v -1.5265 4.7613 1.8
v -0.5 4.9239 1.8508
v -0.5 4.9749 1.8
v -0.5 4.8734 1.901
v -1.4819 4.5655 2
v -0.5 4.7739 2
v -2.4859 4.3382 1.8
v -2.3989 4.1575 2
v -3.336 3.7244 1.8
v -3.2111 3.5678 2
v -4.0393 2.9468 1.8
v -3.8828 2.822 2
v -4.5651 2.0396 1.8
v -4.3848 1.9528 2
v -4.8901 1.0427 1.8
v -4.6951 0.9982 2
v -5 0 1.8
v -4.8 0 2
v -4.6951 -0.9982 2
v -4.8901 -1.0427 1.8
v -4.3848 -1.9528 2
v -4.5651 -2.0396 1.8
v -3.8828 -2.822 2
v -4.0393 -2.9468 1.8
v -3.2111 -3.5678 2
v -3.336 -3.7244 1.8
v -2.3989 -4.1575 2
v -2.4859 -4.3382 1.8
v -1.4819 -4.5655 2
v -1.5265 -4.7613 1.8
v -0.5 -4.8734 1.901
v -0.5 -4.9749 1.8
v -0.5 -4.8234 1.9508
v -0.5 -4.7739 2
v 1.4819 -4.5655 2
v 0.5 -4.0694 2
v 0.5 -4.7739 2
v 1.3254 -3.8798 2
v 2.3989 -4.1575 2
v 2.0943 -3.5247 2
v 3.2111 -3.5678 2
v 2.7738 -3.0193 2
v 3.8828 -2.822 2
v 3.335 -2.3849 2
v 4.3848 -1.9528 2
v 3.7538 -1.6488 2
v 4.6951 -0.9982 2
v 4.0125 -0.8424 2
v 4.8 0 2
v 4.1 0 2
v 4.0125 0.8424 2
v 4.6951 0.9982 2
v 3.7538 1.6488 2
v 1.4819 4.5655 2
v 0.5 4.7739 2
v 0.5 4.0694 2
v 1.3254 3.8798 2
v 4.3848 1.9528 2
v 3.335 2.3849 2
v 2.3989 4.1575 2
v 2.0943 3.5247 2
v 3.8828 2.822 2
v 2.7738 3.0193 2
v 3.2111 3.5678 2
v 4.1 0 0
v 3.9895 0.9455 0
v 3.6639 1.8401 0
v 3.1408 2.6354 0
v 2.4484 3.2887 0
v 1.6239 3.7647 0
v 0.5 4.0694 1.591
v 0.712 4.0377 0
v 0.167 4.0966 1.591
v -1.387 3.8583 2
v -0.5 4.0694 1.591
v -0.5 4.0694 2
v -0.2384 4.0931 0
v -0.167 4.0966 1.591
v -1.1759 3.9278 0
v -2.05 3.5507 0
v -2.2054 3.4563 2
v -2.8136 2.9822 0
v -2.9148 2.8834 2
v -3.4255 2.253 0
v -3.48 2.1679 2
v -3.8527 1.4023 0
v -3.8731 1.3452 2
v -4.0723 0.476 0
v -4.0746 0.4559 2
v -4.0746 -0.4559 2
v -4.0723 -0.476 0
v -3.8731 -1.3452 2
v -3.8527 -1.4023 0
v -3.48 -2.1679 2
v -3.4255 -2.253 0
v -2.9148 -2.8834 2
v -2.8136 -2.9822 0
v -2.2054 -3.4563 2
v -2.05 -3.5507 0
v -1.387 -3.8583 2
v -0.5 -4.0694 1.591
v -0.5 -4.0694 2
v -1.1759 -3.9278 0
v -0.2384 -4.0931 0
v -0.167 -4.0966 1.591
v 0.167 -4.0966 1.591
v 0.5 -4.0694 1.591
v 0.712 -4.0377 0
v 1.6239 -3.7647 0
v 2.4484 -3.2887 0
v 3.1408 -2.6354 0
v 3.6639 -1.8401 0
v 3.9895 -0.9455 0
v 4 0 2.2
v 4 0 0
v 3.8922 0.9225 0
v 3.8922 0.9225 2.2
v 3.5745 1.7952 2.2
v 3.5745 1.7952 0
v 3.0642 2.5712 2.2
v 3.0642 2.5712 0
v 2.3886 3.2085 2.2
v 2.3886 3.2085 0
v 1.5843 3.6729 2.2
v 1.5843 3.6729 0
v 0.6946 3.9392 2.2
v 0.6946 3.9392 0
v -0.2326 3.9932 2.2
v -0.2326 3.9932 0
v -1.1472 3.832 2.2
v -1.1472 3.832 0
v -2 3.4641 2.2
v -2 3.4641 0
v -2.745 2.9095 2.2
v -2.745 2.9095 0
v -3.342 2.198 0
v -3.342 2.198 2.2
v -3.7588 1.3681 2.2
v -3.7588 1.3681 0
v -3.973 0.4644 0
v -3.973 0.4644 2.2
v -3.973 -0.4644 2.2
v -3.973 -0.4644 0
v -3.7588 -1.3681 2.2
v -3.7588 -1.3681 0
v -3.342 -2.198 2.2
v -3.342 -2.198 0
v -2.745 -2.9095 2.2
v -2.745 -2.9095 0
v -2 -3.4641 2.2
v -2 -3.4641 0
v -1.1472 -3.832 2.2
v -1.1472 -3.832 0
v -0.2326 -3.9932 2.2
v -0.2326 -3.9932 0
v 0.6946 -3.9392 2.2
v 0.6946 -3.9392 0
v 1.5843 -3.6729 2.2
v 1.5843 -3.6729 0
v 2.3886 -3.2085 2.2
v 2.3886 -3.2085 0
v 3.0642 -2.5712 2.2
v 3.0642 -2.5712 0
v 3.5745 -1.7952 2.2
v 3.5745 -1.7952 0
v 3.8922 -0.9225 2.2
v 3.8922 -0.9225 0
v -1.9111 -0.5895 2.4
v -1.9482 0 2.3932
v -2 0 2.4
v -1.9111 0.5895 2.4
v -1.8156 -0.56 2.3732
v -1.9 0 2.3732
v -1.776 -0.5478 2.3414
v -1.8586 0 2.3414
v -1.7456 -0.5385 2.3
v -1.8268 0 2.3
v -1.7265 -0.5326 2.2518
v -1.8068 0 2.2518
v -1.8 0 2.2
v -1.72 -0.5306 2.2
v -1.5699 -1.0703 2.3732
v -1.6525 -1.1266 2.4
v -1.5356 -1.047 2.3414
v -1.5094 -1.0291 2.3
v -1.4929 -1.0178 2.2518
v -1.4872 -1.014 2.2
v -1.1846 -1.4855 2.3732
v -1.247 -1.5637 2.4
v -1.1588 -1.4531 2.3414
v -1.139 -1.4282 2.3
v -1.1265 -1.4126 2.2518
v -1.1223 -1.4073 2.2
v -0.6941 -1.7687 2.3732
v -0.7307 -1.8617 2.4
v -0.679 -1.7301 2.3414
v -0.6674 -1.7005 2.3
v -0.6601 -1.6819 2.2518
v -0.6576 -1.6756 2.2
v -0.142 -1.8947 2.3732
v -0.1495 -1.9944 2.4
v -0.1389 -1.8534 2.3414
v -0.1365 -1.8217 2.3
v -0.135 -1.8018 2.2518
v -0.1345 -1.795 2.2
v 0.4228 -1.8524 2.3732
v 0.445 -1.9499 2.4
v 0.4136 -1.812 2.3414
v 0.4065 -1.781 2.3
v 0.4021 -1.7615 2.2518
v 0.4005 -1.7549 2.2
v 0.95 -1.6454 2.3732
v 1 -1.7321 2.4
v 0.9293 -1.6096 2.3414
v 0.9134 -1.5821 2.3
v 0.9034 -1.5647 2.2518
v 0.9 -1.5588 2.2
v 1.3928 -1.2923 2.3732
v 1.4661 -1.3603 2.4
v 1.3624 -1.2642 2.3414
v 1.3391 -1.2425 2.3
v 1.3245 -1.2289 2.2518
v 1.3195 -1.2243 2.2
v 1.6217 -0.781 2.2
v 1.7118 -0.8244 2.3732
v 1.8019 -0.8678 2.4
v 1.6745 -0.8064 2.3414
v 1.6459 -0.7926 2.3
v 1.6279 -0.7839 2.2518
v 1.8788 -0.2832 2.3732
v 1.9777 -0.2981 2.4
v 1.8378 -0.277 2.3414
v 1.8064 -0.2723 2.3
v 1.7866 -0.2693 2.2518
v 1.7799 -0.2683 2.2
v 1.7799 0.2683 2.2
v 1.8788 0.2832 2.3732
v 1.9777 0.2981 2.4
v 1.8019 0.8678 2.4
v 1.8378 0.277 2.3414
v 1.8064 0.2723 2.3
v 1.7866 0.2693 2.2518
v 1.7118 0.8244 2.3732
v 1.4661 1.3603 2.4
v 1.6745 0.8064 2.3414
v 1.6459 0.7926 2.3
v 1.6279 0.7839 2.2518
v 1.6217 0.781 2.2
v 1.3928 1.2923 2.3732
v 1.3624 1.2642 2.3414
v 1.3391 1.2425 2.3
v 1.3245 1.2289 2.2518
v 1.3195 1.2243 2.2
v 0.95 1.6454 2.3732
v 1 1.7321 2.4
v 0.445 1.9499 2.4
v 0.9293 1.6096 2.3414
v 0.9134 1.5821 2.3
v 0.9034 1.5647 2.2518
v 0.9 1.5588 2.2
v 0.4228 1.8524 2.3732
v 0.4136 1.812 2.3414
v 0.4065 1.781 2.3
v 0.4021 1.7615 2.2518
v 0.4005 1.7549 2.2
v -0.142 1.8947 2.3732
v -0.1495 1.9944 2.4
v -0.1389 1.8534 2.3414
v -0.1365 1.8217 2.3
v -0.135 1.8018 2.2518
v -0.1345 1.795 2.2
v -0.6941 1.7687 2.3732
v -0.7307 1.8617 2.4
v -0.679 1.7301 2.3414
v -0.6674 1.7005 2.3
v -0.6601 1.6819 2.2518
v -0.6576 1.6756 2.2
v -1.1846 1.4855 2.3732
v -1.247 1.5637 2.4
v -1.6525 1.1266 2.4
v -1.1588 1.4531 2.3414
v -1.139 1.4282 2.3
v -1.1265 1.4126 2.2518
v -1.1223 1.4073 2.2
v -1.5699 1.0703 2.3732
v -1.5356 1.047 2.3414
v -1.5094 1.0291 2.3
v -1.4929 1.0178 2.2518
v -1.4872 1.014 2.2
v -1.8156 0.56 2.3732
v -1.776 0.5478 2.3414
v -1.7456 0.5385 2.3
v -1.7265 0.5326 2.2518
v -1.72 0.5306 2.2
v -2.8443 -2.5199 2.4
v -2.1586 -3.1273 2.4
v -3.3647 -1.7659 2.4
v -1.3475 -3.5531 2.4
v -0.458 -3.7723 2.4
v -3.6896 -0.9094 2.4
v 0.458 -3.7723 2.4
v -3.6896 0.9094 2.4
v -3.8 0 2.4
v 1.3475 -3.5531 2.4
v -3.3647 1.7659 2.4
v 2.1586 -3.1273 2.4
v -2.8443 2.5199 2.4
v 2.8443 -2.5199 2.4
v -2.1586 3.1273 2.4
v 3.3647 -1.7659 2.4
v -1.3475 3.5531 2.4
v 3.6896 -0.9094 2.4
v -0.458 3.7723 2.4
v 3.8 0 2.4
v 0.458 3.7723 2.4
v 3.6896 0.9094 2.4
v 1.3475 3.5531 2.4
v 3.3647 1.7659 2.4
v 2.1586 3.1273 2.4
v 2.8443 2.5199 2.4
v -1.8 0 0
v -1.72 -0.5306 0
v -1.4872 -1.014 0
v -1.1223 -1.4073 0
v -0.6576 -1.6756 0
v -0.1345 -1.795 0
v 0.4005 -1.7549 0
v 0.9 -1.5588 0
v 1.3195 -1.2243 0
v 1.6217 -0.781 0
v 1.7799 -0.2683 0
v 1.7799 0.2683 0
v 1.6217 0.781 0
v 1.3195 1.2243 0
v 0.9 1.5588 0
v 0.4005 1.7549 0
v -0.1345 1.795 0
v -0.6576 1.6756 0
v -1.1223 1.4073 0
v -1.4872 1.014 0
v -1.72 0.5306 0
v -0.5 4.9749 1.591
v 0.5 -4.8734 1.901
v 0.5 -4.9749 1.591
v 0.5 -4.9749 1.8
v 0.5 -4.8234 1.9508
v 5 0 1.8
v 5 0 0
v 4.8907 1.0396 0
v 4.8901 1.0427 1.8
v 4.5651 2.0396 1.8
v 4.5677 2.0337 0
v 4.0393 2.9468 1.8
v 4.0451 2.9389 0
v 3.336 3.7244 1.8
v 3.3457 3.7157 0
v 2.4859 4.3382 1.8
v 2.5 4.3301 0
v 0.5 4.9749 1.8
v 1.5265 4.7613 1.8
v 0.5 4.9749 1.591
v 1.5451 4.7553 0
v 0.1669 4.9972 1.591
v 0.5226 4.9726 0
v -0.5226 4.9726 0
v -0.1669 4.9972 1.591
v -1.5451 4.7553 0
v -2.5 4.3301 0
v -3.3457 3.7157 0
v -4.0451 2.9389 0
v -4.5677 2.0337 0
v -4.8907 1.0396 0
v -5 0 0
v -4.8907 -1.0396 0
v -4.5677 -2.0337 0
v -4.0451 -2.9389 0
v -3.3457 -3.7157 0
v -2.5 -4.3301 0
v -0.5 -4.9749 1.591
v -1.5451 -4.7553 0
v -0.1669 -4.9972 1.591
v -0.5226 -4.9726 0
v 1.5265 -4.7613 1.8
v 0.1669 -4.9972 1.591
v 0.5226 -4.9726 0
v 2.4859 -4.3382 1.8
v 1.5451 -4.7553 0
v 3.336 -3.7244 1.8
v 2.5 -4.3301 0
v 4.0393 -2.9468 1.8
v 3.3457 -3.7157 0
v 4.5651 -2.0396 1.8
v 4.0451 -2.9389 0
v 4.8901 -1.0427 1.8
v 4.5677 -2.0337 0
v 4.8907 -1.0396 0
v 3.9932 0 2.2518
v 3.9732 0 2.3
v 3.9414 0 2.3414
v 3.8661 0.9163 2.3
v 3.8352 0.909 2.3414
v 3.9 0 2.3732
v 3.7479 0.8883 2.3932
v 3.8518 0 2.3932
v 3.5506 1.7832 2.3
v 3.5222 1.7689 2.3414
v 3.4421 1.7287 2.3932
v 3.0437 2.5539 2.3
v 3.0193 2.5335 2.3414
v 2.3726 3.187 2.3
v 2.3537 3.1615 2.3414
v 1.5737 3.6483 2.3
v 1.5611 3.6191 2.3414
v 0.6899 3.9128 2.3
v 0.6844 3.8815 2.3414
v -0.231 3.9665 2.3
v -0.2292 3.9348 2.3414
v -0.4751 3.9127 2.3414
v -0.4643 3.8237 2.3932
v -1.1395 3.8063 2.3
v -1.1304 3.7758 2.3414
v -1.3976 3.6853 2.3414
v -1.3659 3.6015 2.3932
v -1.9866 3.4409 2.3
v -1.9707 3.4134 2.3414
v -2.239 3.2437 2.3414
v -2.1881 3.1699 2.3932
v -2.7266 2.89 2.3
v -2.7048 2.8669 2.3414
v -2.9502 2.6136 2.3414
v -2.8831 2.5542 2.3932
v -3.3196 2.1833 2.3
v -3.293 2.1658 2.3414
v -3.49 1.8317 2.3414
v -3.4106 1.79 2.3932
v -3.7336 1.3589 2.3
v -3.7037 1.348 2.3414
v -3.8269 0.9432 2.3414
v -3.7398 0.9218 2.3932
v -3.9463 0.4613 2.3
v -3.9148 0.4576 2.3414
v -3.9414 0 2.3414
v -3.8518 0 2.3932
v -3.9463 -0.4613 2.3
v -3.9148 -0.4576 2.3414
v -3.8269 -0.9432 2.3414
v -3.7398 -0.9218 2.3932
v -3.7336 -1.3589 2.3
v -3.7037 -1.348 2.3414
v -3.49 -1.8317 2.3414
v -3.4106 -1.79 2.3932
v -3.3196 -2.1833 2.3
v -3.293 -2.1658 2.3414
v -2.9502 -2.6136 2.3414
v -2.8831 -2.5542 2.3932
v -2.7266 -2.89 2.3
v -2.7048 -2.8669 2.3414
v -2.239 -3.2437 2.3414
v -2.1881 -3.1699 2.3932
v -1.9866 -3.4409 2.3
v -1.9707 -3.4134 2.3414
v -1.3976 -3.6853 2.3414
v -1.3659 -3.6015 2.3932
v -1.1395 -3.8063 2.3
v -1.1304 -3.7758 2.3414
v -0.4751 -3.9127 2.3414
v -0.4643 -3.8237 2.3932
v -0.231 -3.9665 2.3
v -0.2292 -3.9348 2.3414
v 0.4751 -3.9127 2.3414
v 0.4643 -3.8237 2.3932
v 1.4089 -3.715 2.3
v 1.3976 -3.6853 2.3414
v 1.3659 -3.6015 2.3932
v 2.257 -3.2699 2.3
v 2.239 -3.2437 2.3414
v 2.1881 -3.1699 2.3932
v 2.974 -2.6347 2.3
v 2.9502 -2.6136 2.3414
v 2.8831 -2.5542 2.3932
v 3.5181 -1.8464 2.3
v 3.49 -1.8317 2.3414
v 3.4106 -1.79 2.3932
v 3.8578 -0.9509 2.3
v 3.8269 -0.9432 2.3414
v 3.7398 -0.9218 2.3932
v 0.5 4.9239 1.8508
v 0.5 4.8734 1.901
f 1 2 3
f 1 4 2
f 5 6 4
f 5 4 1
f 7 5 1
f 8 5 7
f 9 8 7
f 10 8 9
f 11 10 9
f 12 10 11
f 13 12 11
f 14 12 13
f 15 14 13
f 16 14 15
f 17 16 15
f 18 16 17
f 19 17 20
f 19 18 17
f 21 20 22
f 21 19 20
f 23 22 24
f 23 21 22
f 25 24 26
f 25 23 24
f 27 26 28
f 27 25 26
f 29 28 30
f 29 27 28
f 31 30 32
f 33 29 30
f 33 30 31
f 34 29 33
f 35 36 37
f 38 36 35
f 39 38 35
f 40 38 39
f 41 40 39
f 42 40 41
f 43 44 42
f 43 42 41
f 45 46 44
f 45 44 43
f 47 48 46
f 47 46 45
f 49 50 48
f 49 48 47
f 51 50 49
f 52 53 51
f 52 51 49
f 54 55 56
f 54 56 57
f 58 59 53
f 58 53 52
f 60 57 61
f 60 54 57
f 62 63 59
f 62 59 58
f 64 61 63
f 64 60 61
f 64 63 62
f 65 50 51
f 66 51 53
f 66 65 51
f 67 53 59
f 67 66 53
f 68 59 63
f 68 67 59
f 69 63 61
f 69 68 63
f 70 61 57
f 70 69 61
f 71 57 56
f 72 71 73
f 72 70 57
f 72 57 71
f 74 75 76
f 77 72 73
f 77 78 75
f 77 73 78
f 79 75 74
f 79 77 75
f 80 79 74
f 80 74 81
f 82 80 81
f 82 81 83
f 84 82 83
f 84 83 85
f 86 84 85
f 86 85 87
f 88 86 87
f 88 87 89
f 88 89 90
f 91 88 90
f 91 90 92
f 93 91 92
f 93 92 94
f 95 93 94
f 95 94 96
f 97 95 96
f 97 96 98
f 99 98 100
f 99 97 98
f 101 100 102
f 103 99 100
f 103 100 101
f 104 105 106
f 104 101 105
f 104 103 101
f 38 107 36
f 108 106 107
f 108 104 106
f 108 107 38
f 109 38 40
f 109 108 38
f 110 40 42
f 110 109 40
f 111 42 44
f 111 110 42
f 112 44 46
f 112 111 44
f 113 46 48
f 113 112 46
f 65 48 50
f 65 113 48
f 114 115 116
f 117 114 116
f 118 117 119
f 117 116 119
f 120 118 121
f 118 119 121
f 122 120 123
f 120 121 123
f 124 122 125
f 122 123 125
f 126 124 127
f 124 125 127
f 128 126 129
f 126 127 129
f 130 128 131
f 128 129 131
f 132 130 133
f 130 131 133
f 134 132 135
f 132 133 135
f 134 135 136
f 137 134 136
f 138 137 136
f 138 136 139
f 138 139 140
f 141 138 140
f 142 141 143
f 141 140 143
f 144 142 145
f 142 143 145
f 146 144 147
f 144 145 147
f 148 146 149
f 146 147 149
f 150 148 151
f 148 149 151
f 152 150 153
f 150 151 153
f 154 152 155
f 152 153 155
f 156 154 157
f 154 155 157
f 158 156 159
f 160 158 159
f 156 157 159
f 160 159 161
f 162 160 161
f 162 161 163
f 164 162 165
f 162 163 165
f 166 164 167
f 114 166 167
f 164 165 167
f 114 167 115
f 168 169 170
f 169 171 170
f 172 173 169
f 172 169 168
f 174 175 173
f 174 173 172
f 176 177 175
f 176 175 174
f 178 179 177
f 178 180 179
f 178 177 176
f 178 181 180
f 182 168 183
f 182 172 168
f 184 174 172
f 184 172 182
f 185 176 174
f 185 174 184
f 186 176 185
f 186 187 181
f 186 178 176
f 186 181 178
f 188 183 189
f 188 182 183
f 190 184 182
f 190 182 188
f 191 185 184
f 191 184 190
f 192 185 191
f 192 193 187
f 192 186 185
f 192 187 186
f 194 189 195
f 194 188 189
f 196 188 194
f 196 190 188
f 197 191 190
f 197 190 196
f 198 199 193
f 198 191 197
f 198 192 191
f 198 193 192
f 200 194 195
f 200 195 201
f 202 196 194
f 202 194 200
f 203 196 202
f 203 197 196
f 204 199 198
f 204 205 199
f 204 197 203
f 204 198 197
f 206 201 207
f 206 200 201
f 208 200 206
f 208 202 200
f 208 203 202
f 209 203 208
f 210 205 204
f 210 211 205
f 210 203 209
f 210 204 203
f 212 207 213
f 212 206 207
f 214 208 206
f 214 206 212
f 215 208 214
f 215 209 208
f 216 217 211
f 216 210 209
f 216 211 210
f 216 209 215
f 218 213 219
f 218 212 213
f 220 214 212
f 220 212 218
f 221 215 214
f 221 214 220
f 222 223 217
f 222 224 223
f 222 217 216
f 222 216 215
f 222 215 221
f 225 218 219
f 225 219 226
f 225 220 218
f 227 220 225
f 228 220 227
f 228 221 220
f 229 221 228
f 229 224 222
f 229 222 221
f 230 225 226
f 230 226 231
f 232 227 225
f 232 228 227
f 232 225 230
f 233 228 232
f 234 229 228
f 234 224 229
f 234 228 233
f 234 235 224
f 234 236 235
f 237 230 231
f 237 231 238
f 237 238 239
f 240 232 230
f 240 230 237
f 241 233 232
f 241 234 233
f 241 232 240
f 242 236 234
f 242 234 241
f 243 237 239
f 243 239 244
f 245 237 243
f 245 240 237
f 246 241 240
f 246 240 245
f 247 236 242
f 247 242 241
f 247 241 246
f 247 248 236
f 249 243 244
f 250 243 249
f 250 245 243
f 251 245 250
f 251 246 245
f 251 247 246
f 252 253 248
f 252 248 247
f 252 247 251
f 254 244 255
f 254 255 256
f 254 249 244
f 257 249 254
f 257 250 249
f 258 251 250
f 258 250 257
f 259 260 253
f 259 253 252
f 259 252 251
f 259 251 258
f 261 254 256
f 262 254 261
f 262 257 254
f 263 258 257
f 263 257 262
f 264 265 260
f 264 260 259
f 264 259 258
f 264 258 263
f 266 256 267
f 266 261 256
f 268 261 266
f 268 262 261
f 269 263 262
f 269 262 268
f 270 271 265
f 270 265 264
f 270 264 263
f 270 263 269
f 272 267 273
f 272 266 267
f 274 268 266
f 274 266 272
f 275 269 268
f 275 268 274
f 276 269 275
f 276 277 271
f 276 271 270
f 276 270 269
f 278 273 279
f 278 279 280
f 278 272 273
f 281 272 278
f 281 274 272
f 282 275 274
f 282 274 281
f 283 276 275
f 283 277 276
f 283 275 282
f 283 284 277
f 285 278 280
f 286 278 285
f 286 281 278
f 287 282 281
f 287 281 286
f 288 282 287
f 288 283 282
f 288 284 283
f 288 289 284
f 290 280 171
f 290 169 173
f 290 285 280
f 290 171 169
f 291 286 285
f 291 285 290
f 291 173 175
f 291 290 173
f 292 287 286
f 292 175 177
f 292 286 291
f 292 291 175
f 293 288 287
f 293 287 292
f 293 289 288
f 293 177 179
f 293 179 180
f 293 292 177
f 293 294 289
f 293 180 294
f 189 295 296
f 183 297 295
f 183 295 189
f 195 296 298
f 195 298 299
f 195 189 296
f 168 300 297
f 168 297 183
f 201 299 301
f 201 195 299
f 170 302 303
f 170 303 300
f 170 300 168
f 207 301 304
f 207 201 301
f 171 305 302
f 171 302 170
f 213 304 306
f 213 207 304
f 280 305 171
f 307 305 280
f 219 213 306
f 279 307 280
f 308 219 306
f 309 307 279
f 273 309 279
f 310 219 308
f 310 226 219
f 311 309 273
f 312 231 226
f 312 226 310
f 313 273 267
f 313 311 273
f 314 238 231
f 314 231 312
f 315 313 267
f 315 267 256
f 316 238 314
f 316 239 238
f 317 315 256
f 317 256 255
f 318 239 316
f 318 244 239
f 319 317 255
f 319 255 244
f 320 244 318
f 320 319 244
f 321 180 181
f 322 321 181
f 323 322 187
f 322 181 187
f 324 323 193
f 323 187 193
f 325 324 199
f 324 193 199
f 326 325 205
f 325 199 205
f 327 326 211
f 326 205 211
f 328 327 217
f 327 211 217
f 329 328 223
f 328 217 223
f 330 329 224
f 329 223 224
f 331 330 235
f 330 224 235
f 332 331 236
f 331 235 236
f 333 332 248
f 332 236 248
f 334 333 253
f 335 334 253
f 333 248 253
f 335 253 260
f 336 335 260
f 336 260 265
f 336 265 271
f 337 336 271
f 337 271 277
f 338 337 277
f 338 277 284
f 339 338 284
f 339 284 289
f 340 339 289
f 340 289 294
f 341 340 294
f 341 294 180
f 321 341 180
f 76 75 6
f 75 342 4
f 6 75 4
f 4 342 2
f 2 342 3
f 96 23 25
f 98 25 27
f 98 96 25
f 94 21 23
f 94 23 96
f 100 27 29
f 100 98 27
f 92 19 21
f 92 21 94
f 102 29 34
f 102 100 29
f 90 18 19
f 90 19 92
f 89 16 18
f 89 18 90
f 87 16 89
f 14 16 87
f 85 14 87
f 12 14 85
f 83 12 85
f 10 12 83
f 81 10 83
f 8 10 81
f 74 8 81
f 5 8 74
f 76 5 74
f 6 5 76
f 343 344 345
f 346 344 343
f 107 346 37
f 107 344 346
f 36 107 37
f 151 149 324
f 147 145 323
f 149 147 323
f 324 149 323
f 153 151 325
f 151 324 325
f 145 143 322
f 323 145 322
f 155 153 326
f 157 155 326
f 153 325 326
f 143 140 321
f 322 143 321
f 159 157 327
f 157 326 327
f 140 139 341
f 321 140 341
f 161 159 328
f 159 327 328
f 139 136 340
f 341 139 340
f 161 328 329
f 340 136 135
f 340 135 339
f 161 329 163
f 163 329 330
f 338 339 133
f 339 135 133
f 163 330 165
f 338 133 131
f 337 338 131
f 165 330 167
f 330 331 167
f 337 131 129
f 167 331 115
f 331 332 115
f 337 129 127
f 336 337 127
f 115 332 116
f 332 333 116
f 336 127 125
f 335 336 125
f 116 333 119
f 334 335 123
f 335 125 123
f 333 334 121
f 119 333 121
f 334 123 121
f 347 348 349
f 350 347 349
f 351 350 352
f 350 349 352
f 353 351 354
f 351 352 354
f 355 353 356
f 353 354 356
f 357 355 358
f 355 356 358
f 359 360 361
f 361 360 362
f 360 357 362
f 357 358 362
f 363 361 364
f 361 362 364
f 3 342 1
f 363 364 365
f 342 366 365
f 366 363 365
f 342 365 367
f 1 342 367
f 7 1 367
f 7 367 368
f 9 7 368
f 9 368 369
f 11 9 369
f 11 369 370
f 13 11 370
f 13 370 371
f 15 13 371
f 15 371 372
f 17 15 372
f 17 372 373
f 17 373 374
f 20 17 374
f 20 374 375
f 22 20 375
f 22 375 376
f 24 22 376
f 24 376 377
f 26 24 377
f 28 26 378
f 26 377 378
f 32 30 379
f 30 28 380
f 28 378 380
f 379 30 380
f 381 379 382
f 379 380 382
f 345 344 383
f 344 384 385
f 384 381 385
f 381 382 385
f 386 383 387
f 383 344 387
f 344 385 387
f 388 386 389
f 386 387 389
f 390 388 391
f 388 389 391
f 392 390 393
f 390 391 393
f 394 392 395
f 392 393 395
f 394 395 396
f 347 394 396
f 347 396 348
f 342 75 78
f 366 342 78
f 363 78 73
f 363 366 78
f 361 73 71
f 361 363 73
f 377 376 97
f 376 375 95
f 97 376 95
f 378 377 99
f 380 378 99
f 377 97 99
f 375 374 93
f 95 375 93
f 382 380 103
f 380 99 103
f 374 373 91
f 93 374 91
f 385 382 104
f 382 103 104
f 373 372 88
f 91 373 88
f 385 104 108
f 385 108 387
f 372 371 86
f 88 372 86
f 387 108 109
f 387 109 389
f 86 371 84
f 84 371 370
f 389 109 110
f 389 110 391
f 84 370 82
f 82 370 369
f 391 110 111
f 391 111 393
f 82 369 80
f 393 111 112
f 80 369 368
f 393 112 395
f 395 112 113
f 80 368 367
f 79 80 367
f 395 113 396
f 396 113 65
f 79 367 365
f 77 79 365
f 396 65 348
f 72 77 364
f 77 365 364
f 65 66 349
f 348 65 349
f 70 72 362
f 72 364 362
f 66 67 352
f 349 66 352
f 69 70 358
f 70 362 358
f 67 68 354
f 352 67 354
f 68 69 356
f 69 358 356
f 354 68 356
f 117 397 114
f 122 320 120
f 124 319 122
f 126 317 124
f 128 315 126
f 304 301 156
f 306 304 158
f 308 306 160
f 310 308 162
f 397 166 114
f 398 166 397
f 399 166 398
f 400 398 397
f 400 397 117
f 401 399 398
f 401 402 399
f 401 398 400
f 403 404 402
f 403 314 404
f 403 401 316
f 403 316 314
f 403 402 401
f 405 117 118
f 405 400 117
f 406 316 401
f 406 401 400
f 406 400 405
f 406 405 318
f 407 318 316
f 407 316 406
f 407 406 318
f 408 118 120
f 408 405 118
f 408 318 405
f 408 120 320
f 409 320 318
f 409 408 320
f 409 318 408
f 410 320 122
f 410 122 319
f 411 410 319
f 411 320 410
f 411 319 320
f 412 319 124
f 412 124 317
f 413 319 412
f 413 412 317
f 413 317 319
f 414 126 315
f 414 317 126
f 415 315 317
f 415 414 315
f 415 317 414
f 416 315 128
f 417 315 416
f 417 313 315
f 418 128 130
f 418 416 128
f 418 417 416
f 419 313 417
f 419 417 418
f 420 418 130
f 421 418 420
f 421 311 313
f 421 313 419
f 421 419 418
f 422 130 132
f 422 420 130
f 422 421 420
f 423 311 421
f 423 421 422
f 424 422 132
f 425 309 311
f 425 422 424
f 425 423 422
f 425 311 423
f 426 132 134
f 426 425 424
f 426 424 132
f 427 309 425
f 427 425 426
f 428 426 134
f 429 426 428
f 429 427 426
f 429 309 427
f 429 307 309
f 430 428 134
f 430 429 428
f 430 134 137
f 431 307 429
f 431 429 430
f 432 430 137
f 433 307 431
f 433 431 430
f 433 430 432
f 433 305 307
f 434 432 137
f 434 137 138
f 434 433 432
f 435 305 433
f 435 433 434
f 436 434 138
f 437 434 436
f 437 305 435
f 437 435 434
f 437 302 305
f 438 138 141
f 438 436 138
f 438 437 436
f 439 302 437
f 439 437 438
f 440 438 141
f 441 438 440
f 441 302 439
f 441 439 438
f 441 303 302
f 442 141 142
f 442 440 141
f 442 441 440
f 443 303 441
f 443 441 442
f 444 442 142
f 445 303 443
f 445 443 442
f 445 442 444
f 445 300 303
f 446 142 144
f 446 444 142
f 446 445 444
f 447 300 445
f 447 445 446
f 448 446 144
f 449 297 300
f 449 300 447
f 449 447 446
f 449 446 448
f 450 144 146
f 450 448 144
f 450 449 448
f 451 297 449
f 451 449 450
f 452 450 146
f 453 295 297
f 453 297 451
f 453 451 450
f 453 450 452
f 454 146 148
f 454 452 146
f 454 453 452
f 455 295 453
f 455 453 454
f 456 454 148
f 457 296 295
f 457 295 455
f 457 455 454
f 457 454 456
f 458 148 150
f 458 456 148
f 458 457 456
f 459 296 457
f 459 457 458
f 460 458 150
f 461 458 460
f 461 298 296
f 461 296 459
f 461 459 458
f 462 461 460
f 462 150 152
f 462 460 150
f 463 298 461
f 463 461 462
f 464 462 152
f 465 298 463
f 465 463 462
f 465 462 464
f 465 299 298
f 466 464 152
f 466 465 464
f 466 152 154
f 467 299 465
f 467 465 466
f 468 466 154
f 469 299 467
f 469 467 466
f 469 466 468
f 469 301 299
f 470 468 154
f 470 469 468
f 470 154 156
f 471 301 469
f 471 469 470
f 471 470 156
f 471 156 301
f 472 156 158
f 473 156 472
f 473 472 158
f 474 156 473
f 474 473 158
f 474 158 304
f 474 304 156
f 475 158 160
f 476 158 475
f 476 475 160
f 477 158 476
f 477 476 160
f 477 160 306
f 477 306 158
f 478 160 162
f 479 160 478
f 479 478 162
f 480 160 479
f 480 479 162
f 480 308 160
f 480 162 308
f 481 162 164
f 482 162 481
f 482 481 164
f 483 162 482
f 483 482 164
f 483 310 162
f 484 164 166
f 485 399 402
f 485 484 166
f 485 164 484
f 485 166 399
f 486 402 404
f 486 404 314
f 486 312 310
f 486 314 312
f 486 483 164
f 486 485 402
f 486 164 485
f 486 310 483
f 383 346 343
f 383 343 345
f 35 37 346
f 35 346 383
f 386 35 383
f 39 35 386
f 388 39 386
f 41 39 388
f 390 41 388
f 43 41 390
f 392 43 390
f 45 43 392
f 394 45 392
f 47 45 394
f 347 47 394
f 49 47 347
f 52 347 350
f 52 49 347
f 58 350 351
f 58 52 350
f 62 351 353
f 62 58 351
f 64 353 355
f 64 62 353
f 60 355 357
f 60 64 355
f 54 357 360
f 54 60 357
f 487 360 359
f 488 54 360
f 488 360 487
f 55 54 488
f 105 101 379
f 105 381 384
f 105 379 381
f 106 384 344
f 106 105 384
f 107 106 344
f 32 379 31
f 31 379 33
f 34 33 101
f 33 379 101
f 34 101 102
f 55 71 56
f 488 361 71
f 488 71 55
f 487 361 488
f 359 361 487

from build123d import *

# Parameters (mm, degrees)
F0_R     = 4
F1_DEPTH = 2.4
F0_R_2   = 5
F0_R_3   = 4.1
F2_DEPTH = 2
F3_D     = 3.6
F4_R     = 0.2
F5_SIZE  = 0.2
F6_W     = 1
F6_H     = 0.5
F7_DEPTH = 25


with BuildPart() as f1:
    # F0 (on Top) → F1 (new body)
    with BuildSketch(Plane.XY):
        Circle(F0_R)
    extrude(amount=F1_DEPTH)

    # F3 (through all)
    with Locations(Plane(origin=(0, 0, 0), x_dir=(1, 0, 0), z_dir=(0, 0, -1))):
        with Locations((0, 0)):
            Hole(F3_D / 2)

    # F4
    f4_edges = [f1.edges().sort_by_distance(p)[0] for p in [
        (-4, 0, 2.4),
        (-1.8, 0, 2.4),
    ]]
    fillet(f4_edges, radius=F4_R)


with BuildPart() as f2:
    # F0 (on Top) → F2 (new body)
    with BuildSketch(Plane.XY):
        Circle(F0_R_2)
        Circle(F0_R_3, mode=Mode.SUBTRACT)
    extrude(amount=F2_DEPTH)

    # F5
    f5_edges = [f2.edges().sort_by_distance(p)[0] for p in [
        (-5, 0, 2),
    ]]
    chamfer(f5_edges, length=F5_SIZE)


with BuildPart() as f7:
    # F6 (on Front) → F7 (new body)
    with BuildSketch(Plane.XZ):
        with Locations((0.5, 1.8409643844)):
            Rectangle(F6_W, F6_H)
    extrude(amount=F7_DEPTH)


with BuildPart() as f7_1:
    # F8: moved
    add(f7.part.moved(Location((-0.5, 13.3, 0))))


with BuildPart() as f2_1:
    add(f2.part)

    # F9: cut F7
    add(f7_1.part, mode=Mode.SUBTRACT)


solid = Compound([f1.part, f2_1.part])
